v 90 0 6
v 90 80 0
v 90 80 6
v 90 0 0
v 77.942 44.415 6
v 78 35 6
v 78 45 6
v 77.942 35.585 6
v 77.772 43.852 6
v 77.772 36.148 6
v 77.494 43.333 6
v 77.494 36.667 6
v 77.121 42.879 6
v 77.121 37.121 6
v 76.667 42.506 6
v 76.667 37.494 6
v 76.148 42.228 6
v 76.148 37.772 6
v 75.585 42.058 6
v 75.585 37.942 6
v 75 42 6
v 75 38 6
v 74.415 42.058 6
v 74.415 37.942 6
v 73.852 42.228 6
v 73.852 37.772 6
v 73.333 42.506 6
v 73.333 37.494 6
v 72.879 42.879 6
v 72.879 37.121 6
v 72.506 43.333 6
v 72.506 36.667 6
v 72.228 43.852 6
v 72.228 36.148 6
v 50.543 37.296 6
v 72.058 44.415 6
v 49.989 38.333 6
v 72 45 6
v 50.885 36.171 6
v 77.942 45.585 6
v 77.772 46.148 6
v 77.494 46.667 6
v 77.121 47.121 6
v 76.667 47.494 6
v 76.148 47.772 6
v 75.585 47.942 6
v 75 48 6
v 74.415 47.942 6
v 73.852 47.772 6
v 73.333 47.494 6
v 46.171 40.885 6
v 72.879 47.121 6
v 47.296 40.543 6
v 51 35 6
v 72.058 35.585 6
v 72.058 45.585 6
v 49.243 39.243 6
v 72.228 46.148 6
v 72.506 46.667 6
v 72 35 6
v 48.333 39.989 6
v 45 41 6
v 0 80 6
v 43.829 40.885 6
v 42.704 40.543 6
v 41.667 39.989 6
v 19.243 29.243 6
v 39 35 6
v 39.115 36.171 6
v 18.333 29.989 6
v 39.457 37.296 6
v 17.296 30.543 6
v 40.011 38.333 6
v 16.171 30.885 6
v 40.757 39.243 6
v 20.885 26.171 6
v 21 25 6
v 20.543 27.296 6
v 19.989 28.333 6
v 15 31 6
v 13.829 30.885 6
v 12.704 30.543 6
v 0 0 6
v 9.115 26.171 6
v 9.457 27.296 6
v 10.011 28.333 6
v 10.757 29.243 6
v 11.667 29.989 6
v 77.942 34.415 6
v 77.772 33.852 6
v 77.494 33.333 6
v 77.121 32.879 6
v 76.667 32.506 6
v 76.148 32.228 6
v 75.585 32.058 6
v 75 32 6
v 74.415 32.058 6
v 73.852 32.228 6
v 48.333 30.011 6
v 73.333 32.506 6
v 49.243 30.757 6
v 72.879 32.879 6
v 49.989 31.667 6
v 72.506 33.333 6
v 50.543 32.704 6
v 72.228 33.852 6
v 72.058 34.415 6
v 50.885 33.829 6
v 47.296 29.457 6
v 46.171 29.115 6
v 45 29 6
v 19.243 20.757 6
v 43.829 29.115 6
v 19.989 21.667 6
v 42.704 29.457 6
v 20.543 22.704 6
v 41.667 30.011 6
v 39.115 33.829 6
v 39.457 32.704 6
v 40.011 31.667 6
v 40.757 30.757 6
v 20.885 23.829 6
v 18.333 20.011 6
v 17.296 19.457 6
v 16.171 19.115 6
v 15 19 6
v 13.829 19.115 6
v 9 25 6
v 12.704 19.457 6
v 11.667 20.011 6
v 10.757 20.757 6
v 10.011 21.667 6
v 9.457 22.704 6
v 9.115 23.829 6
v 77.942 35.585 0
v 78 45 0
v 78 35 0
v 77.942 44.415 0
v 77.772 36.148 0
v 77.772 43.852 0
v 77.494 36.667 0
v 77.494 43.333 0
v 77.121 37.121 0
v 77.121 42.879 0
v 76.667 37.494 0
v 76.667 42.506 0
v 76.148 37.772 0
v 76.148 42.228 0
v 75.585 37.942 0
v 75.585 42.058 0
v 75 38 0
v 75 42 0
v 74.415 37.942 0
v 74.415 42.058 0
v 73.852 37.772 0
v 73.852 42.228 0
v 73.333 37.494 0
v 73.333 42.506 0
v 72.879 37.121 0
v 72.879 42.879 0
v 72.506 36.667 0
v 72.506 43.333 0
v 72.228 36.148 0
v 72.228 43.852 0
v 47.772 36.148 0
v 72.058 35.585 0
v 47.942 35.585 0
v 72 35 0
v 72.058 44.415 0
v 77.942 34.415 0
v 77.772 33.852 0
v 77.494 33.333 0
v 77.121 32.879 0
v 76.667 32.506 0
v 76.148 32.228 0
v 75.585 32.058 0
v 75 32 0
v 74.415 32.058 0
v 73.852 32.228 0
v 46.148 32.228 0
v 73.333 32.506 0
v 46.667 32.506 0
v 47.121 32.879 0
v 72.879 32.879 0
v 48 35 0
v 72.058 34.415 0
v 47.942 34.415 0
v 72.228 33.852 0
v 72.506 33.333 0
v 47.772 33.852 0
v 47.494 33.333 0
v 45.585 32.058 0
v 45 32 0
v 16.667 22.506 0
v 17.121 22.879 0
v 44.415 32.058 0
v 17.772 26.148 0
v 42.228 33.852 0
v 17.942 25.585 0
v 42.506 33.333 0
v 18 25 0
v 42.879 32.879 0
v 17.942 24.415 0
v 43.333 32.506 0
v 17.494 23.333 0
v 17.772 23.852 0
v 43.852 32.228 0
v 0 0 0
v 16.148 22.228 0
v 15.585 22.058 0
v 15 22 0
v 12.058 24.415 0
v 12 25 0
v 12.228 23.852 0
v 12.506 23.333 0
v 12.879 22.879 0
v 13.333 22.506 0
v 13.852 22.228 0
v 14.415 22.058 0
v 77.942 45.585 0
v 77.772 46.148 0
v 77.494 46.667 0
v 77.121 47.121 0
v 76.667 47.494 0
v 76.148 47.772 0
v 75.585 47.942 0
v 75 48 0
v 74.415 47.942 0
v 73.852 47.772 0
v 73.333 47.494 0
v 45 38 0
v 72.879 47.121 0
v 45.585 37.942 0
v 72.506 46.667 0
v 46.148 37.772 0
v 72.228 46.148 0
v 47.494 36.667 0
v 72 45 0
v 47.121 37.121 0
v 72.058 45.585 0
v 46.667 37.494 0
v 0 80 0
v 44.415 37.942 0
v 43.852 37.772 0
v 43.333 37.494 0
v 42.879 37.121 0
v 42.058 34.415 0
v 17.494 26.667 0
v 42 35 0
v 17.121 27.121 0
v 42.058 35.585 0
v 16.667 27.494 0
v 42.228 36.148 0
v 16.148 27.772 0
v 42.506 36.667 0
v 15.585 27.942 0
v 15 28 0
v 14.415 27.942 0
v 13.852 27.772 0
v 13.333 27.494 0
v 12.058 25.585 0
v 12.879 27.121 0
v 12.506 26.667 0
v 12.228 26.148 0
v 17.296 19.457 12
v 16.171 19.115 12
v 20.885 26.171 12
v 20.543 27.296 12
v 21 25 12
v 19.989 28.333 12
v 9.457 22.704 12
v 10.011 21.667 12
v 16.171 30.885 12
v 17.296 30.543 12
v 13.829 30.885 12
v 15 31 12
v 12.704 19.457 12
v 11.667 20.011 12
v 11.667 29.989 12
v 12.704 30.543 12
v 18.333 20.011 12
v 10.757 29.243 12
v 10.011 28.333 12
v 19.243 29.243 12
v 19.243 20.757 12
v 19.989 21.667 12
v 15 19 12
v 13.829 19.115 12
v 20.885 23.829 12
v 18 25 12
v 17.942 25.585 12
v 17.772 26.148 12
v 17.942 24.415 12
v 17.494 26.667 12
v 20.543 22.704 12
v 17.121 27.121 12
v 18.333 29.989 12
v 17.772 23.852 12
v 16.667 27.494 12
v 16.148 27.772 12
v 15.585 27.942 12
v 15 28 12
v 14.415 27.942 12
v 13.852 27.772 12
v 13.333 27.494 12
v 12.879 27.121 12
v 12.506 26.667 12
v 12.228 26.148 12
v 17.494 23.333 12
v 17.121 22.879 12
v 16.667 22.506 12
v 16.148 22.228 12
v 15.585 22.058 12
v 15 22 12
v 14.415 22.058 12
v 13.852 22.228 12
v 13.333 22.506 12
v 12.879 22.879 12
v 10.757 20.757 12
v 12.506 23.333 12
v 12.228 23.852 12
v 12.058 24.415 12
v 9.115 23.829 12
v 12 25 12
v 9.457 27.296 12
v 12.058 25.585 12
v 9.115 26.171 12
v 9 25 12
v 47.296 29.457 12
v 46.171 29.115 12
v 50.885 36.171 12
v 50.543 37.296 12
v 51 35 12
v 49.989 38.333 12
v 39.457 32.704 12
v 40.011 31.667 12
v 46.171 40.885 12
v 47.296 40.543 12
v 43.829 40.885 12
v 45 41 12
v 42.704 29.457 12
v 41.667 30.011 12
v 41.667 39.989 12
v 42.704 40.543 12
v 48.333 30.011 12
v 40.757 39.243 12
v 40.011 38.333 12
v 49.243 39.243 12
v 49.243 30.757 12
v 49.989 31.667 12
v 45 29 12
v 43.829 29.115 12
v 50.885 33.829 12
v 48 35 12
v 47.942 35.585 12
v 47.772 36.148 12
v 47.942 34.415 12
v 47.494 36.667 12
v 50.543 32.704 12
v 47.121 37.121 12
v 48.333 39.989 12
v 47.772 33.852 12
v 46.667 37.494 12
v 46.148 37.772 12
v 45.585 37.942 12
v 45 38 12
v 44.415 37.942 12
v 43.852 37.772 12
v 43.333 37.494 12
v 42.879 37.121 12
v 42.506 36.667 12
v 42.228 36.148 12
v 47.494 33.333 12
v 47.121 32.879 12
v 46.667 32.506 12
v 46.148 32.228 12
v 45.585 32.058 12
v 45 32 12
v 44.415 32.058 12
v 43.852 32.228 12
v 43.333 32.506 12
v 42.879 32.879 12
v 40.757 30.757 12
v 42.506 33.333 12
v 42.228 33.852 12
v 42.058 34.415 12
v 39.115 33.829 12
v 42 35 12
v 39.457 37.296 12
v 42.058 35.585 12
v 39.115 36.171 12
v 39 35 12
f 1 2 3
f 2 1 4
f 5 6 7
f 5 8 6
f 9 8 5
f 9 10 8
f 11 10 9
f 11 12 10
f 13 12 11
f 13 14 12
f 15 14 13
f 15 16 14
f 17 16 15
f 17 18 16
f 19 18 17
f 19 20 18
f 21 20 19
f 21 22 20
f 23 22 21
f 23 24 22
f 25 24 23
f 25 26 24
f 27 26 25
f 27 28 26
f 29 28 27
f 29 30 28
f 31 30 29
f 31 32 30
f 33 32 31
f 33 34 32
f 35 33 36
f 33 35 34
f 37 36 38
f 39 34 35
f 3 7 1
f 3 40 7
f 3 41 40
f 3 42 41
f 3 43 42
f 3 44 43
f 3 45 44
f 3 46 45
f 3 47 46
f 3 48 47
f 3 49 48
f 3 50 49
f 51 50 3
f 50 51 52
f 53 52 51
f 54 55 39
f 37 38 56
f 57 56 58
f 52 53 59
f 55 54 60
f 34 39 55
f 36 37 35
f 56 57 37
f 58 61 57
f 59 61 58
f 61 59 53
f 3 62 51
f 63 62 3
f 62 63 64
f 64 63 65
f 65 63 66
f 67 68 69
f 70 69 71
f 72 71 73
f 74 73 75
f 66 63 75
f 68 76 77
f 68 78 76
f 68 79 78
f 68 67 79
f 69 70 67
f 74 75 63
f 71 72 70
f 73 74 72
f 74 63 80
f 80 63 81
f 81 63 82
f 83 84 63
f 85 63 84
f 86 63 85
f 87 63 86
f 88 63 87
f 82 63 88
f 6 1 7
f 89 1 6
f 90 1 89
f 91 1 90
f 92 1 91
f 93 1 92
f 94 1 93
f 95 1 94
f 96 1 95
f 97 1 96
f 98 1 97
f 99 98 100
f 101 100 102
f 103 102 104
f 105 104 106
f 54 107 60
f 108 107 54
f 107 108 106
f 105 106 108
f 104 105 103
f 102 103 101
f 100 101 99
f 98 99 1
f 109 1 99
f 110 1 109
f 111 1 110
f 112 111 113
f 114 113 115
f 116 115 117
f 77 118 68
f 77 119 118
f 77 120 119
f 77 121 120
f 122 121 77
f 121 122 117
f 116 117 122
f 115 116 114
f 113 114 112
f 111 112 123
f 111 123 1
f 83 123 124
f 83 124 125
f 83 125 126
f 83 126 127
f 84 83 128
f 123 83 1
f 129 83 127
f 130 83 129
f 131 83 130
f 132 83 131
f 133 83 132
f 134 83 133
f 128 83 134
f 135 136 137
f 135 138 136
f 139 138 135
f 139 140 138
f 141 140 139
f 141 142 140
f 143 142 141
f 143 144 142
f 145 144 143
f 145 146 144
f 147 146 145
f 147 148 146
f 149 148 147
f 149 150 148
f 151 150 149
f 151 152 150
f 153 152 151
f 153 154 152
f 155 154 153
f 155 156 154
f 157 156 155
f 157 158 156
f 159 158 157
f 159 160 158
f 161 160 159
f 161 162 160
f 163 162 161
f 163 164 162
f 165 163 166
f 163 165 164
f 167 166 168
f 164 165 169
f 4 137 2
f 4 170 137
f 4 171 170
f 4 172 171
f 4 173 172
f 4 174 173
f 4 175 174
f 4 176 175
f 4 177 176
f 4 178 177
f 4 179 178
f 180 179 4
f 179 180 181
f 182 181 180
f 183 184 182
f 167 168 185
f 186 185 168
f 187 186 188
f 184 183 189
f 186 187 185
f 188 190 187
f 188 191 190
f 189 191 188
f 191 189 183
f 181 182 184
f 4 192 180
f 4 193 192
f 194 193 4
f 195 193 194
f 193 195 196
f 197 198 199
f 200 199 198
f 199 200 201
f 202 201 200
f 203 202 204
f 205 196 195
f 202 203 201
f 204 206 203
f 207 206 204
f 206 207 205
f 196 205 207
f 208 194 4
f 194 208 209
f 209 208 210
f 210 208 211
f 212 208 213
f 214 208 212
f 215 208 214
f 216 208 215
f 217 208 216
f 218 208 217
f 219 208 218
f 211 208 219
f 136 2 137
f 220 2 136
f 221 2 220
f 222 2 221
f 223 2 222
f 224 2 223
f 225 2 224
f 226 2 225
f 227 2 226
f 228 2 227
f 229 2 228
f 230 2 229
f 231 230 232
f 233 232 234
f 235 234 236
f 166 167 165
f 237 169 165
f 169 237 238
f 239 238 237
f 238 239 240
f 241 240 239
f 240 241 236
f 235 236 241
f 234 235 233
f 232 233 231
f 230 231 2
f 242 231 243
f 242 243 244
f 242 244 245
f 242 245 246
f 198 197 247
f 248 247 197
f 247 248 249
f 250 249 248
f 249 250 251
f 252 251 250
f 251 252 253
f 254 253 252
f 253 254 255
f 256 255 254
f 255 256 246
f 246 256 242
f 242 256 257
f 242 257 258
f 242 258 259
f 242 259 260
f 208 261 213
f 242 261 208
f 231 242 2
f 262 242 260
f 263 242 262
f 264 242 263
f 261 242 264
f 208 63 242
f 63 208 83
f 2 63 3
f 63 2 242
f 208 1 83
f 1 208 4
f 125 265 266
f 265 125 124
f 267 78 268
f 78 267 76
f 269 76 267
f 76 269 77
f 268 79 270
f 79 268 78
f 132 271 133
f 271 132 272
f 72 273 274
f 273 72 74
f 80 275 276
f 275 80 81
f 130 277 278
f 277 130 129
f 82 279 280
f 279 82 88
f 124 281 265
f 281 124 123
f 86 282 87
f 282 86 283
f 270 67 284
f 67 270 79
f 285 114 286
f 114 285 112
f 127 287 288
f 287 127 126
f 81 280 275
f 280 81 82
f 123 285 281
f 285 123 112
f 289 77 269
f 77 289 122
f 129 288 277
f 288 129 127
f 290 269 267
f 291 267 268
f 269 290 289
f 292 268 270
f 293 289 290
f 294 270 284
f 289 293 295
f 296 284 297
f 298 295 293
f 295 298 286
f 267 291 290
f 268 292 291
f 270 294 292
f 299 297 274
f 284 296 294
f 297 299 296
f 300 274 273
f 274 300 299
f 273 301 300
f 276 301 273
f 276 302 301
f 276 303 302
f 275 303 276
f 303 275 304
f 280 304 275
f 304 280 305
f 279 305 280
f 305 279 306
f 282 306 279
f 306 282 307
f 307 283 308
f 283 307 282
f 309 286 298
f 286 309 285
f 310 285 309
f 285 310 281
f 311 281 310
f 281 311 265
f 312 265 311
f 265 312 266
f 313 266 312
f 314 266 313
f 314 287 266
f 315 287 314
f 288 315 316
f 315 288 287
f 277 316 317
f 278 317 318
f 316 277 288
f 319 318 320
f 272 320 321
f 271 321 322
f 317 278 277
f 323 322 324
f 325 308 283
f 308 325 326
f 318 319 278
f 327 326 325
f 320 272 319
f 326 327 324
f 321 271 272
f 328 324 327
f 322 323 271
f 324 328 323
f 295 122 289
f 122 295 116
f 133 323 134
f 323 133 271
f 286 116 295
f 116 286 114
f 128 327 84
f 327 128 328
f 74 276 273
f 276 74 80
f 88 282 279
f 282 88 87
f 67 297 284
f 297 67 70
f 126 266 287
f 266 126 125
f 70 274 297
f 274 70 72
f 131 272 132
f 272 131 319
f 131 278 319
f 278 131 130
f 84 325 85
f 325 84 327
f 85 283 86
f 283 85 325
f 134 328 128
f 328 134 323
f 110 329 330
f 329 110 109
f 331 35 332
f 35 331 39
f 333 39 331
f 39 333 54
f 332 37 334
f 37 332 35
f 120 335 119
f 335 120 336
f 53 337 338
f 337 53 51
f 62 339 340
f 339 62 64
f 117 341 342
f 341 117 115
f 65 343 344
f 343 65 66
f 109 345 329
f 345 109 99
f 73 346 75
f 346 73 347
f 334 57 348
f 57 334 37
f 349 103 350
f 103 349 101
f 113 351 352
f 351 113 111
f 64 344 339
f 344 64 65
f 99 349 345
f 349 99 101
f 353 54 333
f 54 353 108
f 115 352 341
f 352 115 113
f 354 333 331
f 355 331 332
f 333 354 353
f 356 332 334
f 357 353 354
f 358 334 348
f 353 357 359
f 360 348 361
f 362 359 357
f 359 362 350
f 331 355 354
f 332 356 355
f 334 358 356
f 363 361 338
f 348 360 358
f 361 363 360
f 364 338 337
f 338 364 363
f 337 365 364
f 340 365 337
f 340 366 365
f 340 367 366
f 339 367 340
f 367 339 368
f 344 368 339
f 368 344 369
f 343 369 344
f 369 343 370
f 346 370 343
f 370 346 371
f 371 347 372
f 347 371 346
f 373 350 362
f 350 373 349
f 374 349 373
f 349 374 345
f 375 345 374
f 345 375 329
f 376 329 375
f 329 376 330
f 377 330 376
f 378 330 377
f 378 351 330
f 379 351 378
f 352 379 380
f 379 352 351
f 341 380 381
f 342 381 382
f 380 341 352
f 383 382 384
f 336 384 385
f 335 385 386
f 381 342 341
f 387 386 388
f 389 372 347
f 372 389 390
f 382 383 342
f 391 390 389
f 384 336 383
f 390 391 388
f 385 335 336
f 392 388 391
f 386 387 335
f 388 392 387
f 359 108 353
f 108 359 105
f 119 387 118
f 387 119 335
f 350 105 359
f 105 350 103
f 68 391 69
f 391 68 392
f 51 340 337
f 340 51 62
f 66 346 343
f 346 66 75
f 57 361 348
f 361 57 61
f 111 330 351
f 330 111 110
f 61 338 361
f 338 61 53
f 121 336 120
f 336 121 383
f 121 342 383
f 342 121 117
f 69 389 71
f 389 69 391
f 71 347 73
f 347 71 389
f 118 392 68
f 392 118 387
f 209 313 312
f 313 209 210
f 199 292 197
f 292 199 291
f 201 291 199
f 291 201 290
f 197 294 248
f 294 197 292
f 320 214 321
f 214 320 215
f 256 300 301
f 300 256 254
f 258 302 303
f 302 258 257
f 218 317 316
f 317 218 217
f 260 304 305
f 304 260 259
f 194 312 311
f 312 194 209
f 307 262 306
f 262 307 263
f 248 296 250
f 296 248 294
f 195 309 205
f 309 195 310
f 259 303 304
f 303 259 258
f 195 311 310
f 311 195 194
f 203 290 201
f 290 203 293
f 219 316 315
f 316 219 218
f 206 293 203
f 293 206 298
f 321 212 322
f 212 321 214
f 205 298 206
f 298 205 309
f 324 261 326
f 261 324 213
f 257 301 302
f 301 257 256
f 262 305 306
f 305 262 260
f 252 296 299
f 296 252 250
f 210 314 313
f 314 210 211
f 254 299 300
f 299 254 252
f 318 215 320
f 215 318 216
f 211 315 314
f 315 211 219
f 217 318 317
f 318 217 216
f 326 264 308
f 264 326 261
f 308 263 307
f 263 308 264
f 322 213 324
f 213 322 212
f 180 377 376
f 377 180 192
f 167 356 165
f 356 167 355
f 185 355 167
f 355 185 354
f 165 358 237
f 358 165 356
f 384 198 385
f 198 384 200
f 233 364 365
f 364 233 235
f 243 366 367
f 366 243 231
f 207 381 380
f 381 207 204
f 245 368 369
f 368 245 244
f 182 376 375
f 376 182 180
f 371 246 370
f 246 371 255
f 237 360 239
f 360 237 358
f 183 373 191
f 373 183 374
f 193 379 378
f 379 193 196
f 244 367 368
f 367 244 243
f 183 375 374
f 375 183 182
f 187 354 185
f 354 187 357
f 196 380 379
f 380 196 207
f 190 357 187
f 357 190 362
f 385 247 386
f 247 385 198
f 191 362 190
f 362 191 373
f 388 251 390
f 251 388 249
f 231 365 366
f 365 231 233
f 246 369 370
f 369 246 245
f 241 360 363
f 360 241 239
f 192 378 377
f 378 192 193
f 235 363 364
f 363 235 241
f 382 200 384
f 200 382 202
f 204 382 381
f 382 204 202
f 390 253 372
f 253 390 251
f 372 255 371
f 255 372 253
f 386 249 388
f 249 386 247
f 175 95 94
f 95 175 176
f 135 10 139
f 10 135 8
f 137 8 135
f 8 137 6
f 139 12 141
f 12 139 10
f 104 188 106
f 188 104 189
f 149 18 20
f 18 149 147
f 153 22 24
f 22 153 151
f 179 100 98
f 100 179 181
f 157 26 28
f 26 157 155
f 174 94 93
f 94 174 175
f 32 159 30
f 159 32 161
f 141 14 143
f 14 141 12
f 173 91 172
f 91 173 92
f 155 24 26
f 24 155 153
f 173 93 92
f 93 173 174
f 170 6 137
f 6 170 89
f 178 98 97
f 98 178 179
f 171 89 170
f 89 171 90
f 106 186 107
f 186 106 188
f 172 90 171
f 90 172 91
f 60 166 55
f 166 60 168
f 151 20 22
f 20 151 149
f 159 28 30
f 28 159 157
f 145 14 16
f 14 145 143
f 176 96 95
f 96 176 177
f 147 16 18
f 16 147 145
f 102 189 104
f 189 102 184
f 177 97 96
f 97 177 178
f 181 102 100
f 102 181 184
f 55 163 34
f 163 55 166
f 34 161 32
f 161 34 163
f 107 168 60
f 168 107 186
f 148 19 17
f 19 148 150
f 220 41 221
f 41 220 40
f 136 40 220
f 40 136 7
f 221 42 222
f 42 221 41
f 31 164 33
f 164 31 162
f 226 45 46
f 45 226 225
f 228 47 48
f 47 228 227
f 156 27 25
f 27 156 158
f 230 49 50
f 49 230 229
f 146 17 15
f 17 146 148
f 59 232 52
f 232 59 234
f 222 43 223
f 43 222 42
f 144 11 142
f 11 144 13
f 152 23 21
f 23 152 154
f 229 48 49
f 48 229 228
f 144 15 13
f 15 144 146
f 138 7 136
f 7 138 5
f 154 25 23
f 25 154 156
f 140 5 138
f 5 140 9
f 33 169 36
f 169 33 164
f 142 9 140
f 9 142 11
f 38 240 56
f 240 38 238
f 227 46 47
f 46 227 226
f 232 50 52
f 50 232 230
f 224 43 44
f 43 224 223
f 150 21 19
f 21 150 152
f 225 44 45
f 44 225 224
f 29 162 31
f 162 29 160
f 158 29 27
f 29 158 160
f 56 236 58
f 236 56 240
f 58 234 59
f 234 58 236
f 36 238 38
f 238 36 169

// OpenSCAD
$fn = 32;

// ----------------------------------------------------------------------
// Mixed field: bosses and holes at given coordinates
// ----------------------------------------------------------------------

// --- parameters (mm) ---
plate_l = 90;             // plate length, X
plate_w = 80;             // plate width, Y
plate_t = 6;              // plate thickness, Z
boss_d = 12;              // boss diameter
boss_h = 6;               // boss height above the plate
hole_d = 6;               // through hole diameter

total_h = plate_t + boss_h;  // overall height

difference() {
  union() {
    cube([plate_l, plate_w, plate_t]);
    translate([15, 25, plate_t]) cylinder(h = boss_h, d = boss_d);
    translate([45, 35, plate_t]) cylinder(h = boss_h, d = boss_d);
  }
  translate([15, 25, -1]) cylinder(h = total_h + 2, d = boss_d / 2);
  translate([45, 35, -1]) cylinder(h = total_h + 2, d = boss_d / 2);
  translate([75, 35, -1]) cylinder(h = plate_t + 2, d = hole_d);
  translate([75, 45, -1]) cylinder(h = plate_t + 2, d = hole_d);
}
